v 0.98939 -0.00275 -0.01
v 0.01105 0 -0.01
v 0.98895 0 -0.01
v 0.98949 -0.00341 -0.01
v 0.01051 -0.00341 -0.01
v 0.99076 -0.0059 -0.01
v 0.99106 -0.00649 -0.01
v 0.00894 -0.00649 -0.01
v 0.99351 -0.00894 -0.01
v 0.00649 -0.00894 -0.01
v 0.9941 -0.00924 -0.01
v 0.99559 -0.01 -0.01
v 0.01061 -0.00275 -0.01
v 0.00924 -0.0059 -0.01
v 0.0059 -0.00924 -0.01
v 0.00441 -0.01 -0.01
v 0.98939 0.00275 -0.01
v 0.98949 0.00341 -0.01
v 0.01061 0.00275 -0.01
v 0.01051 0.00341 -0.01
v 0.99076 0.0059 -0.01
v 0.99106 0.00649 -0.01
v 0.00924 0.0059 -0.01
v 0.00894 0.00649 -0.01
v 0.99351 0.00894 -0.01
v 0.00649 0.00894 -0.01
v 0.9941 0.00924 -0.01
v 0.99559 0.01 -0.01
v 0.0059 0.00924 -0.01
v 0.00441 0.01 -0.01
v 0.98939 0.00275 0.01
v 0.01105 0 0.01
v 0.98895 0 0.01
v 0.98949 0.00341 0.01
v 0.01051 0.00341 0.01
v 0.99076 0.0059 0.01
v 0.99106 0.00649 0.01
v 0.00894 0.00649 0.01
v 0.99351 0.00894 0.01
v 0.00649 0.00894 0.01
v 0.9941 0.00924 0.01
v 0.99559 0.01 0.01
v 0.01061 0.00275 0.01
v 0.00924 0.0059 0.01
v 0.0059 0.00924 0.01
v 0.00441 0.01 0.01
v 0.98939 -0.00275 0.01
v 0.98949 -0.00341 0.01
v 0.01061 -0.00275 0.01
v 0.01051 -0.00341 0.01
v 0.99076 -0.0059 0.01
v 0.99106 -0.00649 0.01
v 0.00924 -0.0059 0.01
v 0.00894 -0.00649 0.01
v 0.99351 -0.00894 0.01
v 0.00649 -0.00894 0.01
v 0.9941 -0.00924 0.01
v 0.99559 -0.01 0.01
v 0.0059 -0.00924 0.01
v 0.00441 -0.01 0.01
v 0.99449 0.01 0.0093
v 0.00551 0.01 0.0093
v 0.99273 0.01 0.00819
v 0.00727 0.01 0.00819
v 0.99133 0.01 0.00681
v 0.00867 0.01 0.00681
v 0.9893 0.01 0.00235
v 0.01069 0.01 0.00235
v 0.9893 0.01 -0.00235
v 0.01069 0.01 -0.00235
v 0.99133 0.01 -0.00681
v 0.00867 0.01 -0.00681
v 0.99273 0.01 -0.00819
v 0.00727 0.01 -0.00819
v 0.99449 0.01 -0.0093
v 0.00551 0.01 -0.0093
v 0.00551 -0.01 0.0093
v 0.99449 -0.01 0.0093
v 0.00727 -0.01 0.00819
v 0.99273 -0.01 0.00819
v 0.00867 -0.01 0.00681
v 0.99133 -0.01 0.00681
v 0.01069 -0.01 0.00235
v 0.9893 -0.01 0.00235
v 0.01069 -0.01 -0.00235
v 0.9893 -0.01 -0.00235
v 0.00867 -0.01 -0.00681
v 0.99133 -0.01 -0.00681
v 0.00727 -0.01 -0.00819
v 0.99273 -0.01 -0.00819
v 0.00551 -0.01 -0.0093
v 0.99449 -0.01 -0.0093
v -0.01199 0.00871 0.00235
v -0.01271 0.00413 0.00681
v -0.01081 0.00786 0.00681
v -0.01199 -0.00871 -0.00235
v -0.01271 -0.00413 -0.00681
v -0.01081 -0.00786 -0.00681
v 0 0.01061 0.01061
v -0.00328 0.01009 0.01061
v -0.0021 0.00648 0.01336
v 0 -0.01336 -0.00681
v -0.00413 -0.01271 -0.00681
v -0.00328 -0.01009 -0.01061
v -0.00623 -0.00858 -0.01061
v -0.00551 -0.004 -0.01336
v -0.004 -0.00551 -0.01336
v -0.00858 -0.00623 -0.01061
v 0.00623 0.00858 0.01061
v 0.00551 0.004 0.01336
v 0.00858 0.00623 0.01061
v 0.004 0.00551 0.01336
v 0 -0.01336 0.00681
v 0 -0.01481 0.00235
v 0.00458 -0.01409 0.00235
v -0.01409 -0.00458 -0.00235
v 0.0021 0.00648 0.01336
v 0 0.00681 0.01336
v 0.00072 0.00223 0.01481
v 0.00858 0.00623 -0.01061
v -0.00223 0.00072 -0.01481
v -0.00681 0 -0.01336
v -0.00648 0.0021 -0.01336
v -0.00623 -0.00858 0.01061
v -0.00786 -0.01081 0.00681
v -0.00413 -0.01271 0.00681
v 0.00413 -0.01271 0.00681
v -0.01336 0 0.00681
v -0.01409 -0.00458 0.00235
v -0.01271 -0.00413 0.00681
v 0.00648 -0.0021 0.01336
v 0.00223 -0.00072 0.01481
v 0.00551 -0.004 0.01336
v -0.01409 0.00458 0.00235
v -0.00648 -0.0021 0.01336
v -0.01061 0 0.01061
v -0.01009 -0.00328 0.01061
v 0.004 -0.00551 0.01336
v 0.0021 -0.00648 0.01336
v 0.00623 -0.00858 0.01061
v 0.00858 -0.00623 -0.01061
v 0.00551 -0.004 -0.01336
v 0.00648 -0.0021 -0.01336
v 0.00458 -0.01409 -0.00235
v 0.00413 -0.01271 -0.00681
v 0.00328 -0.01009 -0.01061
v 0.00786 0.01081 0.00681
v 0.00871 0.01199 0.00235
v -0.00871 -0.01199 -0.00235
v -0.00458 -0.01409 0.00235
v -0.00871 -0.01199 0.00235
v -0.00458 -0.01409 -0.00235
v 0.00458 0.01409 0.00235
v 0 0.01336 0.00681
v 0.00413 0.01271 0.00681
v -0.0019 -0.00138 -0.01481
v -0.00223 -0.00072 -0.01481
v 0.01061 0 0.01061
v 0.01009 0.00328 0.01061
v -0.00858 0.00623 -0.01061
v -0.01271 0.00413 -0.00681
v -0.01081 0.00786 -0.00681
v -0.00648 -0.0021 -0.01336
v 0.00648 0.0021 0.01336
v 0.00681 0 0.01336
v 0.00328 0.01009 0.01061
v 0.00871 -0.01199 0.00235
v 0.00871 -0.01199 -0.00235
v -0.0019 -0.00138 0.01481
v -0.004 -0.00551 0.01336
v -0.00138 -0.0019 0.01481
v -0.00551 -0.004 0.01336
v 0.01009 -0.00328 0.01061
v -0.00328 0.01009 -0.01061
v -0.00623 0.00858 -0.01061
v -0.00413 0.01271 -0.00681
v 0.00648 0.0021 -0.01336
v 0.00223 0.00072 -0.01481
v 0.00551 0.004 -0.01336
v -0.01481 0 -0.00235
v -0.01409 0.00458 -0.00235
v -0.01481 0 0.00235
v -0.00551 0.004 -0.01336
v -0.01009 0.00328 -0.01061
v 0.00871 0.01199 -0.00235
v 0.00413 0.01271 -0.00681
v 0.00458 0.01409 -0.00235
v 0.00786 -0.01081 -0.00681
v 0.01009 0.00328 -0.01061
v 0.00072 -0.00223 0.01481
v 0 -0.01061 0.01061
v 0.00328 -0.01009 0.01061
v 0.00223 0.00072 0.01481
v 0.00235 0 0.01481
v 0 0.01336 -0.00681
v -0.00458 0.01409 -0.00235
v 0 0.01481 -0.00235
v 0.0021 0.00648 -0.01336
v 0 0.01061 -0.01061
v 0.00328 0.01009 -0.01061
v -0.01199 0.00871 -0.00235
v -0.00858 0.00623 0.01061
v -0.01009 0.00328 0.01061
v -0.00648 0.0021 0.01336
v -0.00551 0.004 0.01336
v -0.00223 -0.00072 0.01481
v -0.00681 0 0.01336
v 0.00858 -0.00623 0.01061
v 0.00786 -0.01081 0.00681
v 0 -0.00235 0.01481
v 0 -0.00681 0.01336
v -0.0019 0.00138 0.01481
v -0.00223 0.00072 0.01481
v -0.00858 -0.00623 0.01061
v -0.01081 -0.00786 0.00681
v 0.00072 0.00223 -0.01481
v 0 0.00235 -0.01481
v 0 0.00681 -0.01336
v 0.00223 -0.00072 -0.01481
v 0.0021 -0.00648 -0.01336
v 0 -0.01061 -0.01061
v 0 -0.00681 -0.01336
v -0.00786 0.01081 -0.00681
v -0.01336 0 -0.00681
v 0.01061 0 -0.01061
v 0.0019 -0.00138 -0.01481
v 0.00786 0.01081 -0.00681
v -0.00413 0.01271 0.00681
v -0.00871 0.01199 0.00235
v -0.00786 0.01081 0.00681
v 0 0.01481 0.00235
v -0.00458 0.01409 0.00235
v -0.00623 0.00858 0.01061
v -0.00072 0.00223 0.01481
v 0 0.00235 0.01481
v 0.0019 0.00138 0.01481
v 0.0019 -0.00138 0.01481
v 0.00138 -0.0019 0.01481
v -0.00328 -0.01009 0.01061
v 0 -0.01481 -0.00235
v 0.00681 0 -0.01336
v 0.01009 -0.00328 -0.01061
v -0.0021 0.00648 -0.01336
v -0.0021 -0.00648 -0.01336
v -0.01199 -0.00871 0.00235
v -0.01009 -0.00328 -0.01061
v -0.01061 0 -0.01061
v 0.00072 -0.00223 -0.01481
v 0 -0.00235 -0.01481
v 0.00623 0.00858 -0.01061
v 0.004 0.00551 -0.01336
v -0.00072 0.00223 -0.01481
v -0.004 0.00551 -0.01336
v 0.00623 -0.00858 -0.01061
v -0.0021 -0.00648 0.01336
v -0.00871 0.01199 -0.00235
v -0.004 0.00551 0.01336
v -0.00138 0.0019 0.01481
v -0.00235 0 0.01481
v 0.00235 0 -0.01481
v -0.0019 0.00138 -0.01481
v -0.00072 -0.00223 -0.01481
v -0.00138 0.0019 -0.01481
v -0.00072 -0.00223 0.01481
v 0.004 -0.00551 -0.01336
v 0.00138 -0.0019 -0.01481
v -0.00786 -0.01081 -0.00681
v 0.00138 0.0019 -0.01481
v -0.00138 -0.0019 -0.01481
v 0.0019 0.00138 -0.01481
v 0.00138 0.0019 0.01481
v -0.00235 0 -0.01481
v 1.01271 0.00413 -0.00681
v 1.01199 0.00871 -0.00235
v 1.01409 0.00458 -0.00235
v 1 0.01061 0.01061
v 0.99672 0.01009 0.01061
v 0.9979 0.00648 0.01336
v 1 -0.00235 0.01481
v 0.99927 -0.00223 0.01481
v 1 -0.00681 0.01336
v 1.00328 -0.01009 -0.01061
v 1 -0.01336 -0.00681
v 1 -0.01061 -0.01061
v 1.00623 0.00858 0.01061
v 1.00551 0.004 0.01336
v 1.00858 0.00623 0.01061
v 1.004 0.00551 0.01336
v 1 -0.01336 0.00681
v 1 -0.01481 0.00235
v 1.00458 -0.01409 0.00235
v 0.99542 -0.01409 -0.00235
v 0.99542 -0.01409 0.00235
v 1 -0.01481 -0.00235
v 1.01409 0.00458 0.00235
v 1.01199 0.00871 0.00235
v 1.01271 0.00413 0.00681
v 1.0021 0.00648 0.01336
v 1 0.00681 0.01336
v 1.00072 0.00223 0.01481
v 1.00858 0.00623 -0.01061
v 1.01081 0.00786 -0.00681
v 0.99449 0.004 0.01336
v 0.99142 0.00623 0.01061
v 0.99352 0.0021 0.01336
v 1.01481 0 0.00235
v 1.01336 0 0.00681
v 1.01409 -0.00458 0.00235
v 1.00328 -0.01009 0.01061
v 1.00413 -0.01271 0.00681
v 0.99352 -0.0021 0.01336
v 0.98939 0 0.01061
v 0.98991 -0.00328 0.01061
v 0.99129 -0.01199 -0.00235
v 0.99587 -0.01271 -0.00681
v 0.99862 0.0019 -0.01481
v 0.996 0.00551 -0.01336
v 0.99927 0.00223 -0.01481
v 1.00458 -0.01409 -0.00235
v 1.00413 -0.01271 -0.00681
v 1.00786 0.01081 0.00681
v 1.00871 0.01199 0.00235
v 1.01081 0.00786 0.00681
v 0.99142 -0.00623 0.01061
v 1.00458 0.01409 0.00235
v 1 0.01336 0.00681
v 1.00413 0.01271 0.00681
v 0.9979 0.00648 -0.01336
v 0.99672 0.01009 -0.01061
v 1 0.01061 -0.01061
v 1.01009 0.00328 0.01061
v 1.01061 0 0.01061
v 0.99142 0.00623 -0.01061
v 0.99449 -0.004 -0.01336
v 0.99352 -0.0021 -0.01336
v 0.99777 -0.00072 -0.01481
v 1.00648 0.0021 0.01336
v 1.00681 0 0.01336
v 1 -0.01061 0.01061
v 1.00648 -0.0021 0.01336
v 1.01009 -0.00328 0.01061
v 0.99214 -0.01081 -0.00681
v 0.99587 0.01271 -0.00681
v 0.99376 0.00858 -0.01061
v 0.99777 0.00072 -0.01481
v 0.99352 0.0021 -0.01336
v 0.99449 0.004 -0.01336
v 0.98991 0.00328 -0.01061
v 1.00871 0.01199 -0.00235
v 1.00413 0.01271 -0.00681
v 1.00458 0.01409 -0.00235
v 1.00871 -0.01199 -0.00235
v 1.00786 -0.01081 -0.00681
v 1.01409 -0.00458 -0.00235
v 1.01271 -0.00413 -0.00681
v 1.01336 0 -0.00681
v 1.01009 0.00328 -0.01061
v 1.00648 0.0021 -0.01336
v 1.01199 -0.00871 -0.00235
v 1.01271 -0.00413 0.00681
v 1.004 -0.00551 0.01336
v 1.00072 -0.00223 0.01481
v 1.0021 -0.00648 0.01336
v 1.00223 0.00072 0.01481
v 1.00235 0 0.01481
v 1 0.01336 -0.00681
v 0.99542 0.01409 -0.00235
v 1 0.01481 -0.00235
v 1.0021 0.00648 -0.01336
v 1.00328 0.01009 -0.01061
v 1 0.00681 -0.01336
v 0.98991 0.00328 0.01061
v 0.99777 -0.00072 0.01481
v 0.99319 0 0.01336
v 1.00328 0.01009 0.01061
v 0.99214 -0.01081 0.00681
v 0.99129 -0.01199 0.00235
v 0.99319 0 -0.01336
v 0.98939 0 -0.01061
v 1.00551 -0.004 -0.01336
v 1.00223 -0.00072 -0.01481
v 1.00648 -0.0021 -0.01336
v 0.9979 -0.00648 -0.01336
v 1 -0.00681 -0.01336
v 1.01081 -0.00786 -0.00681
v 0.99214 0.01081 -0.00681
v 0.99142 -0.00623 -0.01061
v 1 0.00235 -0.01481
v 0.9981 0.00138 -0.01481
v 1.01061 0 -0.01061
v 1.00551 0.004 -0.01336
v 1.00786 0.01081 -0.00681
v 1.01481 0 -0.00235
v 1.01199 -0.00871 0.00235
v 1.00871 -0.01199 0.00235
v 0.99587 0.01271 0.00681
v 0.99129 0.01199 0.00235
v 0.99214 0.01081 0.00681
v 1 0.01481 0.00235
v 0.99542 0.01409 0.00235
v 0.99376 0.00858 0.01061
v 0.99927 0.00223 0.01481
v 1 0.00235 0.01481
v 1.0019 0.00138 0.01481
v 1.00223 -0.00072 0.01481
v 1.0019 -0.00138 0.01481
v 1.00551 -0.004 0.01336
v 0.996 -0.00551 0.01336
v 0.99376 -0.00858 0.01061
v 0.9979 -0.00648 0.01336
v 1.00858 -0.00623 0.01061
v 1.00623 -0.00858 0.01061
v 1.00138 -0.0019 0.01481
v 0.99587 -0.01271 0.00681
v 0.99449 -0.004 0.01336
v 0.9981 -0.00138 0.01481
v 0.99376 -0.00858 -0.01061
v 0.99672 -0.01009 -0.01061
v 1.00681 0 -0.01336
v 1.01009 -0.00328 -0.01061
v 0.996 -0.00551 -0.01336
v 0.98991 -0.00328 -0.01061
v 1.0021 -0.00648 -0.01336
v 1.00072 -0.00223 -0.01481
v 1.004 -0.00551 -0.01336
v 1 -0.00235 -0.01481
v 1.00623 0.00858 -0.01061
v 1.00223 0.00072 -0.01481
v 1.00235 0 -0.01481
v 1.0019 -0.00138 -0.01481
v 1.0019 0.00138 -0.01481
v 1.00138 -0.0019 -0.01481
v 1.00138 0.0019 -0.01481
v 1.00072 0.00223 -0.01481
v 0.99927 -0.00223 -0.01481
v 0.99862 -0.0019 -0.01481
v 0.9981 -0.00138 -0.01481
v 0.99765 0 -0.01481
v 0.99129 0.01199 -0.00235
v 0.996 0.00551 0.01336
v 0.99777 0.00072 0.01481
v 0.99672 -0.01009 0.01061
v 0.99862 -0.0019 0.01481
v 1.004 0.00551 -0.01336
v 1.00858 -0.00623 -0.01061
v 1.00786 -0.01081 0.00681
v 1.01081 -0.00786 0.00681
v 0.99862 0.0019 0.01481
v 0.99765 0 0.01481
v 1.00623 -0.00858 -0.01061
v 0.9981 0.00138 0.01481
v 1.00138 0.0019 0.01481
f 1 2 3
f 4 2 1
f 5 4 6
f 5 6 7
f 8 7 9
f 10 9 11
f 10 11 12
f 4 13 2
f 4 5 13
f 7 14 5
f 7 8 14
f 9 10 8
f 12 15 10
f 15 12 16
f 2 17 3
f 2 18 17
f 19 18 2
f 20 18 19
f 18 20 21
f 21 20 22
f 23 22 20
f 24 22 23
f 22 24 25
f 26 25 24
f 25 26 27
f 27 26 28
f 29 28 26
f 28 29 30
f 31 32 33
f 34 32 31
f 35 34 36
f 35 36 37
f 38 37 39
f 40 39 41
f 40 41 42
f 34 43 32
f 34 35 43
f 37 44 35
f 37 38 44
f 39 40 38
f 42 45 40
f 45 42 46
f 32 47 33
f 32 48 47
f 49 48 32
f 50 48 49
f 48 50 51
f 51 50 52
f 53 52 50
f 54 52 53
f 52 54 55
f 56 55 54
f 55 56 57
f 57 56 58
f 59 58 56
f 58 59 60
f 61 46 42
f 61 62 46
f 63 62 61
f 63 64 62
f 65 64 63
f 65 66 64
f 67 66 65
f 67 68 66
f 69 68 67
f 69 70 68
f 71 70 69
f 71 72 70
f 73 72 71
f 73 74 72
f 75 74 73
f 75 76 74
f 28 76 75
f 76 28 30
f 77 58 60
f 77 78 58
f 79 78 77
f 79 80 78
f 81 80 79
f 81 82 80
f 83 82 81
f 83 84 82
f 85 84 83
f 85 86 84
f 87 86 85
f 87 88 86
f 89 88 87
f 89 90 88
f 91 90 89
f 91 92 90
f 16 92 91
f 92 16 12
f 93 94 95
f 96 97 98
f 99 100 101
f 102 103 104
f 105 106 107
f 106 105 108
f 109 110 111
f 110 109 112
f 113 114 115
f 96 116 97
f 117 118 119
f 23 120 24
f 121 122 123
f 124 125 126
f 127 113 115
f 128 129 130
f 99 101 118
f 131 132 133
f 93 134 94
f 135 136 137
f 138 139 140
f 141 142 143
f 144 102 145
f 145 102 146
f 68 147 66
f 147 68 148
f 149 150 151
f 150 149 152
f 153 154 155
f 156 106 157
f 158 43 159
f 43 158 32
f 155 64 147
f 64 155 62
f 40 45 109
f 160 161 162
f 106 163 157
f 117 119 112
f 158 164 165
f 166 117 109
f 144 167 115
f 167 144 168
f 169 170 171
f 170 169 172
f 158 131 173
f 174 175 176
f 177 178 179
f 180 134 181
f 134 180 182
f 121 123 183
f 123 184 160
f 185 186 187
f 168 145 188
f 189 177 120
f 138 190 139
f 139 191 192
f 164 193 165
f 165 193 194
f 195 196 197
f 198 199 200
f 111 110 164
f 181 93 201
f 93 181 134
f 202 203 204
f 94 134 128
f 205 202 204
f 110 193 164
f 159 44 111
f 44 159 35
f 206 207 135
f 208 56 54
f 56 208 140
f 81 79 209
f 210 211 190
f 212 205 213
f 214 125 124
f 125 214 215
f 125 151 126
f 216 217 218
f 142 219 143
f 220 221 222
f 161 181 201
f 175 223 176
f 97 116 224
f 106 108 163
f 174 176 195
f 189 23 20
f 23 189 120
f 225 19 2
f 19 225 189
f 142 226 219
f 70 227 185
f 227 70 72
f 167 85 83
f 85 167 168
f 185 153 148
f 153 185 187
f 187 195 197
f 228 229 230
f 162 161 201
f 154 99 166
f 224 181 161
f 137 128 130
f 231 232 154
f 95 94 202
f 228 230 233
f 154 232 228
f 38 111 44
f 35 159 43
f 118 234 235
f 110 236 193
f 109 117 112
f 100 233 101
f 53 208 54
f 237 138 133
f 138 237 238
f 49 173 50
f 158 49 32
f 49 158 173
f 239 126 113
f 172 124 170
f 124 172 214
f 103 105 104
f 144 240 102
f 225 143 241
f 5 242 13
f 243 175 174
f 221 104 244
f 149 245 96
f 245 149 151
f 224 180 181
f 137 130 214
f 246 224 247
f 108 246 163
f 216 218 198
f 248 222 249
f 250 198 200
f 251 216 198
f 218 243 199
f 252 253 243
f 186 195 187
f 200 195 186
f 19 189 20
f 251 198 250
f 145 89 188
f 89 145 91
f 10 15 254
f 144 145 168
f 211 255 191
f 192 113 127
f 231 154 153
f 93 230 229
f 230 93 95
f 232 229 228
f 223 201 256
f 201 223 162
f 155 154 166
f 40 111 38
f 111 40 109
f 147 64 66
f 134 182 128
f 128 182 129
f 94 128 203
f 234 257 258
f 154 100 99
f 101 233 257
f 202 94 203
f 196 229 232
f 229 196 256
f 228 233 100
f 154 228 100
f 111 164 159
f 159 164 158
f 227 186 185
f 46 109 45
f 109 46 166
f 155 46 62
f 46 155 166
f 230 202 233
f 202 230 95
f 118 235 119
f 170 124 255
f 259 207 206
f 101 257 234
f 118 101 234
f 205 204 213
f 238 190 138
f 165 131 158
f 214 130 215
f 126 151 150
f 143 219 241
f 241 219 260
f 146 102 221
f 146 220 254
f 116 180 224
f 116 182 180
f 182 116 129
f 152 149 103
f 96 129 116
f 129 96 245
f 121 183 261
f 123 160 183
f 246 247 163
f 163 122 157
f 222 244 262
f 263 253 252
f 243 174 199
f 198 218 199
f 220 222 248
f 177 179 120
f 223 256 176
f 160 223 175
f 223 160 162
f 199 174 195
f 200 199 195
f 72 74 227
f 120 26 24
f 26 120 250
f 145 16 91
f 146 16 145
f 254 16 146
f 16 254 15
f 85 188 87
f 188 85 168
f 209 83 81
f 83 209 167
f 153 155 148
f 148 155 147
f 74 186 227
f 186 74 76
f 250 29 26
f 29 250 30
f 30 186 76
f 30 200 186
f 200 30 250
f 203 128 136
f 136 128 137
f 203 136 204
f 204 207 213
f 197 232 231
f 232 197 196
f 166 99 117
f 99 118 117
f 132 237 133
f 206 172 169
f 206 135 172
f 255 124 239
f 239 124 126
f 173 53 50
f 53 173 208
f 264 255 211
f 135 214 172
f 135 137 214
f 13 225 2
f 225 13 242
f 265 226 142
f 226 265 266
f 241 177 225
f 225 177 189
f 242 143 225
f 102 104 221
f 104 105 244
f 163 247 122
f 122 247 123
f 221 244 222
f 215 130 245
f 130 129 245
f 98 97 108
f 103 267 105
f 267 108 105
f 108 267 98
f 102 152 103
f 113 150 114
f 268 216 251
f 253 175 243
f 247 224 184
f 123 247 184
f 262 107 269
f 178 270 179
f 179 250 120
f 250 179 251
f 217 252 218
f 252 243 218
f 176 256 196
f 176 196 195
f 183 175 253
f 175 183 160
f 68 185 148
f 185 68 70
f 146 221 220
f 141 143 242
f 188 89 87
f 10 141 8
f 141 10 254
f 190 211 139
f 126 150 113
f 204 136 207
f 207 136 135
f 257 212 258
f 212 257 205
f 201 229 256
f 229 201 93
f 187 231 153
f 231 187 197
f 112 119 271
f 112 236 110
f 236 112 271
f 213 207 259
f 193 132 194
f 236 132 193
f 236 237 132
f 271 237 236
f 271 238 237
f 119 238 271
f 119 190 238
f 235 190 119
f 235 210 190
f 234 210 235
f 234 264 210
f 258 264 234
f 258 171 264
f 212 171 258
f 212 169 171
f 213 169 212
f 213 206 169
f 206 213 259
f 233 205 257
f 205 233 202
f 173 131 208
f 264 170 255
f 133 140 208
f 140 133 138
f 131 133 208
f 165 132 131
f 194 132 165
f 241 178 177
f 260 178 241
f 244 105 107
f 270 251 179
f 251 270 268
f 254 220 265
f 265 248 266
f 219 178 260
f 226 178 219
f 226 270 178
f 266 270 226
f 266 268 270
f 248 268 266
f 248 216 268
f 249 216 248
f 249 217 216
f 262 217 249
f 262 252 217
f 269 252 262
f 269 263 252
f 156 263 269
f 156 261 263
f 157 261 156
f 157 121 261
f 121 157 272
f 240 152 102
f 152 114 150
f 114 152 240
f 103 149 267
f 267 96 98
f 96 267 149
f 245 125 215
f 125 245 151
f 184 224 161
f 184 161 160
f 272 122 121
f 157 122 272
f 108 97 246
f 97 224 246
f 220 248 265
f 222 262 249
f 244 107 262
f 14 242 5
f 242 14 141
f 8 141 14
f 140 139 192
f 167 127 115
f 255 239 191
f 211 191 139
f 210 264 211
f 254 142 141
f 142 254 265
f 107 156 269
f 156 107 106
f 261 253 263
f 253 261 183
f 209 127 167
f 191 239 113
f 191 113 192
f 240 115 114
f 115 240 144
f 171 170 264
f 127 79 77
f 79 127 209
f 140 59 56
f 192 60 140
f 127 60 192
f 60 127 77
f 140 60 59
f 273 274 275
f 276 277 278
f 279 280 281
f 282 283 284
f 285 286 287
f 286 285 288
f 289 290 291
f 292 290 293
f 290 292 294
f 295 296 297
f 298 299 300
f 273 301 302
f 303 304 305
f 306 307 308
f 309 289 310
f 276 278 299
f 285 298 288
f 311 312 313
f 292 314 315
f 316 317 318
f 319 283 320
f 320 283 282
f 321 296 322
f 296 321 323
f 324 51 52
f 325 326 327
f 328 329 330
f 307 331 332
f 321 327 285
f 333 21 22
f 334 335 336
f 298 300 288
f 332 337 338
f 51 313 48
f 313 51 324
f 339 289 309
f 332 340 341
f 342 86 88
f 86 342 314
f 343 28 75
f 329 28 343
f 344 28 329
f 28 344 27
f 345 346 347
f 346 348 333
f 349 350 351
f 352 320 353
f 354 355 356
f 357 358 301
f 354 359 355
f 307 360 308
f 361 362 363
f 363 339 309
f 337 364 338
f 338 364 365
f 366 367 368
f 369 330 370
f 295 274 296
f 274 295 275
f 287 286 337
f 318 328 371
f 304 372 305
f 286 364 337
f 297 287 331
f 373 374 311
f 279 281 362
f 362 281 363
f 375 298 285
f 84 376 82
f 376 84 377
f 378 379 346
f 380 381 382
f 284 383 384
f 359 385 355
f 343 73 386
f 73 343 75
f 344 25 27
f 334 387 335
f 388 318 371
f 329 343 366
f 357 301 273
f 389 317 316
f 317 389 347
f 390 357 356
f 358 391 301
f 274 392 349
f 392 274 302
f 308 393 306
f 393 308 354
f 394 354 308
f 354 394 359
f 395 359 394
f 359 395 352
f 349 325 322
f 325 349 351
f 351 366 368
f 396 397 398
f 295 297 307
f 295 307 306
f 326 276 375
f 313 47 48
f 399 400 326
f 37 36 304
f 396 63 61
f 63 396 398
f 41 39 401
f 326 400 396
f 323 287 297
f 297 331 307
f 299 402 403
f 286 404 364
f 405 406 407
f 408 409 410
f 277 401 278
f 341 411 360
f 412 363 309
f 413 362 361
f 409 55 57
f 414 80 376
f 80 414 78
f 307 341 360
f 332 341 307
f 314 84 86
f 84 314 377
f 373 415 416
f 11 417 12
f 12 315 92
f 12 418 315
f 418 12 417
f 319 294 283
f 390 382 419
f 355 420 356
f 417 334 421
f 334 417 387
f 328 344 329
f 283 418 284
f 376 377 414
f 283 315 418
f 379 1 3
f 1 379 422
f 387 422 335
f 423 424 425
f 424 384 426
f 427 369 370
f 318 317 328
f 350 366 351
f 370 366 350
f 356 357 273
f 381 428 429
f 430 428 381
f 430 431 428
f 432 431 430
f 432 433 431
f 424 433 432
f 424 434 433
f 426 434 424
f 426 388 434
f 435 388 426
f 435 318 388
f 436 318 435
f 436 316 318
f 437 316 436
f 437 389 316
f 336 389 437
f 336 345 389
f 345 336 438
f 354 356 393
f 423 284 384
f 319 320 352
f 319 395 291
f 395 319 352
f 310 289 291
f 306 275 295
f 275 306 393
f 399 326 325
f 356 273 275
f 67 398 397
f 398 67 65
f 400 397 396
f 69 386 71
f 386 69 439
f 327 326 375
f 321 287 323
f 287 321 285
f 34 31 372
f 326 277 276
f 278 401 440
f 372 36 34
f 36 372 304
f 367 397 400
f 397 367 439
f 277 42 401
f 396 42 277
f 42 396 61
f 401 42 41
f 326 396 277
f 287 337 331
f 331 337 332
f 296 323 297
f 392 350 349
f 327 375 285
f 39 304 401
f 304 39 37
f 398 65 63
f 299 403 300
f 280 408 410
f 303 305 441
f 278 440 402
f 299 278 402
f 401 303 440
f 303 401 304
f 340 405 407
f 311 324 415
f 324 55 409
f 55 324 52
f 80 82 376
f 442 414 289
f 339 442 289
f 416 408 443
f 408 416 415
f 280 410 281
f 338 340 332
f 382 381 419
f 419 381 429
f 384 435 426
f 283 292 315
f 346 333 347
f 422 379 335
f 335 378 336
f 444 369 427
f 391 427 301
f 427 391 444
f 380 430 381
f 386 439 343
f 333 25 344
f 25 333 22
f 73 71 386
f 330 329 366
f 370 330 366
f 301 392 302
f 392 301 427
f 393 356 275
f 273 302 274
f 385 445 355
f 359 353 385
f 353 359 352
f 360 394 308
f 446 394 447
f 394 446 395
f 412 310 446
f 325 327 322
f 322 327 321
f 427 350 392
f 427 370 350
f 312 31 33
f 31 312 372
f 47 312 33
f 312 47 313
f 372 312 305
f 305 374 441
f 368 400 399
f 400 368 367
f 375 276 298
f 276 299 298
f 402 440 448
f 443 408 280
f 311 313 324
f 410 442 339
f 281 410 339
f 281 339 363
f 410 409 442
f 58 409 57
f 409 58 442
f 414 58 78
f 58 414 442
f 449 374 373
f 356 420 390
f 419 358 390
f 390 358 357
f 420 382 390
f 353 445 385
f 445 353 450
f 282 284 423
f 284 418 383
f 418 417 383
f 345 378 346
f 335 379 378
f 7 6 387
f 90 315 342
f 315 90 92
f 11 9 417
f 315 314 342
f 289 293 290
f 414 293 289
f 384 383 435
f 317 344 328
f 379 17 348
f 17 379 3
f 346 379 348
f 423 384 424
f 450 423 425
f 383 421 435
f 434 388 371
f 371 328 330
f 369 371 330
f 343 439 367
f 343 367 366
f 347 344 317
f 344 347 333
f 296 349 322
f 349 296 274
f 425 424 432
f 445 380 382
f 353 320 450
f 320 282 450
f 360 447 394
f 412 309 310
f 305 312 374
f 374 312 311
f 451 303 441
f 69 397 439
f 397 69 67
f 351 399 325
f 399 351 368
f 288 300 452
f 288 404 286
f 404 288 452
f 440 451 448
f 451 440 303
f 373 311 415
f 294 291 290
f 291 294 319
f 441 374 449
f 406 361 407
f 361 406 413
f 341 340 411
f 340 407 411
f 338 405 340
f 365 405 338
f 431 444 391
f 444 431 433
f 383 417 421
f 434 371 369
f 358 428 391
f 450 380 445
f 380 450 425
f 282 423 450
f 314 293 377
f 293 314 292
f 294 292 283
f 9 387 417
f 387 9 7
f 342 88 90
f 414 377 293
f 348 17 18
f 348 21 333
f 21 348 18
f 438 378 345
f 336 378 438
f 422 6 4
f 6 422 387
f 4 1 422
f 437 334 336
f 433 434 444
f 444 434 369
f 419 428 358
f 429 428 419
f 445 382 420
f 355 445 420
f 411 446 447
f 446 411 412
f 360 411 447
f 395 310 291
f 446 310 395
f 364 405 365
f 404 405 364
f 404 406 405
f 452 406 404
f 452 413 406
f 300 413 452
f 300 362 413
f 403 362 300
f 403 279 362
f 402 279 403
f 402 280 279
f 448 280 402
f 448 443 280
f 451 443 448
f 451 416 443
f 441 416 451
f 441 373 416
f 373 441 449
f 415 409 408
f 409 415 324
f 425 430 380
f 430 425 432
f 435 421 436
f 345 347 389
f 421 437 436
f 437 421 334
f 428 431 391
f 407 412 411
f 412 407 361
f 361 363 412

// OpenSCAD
// Auto-generated extrusion assembly
$fn = 20;

module extrusion_2020(length)
{
  // 20mm x 20mm extrusion, colored faces
  translate([0, 0, length / 2]) difference()
  {
    cube([0.02, 0.02, length], center = true); // Hollow out slightly for visual effect
    cube([0.016, 0.016, length + 0.001], center = true);
  }
}

module colored_extrusion(start, end, white_dir)
{
  // Calculate direction and length
  dir = end -start;
  len = norm(dir); // Calculate rotation to align Z with direction
  if(len > 0.001)
  {
    translate(start) multmatrix(m = look_at(dir, white_dir)) extrusion_2020(len);
  }
}

// Look-at matrix helper
function look_at(dir, up) = let(z = dir / norm(dir), x = cross(up, z) / norm(cross(up, z)), y = cross(z, x))
  [[x[0], y[0], z[0], 0], [x[1], y[1], z[1], 0], [x[2], y[2], z[2], 0], [0, 0, 0, 1]];

module connector(pos)
{
  translate(pos) color([0.3, 0.3, 0.3]) sphere(r = 0.015);
}

// Extrusion 1
translate([0.500000, 0.000000, 0.000000]) rotate([0, 90.00, 0.00]) color([0.7, 0.7, 0.8])
  cube([0.02, 0.02, 1.000000], center = true);

connector([0.000000, 0.000000, 0.000000]);
connector([1.000000, 0.000000, 0.000000]);
